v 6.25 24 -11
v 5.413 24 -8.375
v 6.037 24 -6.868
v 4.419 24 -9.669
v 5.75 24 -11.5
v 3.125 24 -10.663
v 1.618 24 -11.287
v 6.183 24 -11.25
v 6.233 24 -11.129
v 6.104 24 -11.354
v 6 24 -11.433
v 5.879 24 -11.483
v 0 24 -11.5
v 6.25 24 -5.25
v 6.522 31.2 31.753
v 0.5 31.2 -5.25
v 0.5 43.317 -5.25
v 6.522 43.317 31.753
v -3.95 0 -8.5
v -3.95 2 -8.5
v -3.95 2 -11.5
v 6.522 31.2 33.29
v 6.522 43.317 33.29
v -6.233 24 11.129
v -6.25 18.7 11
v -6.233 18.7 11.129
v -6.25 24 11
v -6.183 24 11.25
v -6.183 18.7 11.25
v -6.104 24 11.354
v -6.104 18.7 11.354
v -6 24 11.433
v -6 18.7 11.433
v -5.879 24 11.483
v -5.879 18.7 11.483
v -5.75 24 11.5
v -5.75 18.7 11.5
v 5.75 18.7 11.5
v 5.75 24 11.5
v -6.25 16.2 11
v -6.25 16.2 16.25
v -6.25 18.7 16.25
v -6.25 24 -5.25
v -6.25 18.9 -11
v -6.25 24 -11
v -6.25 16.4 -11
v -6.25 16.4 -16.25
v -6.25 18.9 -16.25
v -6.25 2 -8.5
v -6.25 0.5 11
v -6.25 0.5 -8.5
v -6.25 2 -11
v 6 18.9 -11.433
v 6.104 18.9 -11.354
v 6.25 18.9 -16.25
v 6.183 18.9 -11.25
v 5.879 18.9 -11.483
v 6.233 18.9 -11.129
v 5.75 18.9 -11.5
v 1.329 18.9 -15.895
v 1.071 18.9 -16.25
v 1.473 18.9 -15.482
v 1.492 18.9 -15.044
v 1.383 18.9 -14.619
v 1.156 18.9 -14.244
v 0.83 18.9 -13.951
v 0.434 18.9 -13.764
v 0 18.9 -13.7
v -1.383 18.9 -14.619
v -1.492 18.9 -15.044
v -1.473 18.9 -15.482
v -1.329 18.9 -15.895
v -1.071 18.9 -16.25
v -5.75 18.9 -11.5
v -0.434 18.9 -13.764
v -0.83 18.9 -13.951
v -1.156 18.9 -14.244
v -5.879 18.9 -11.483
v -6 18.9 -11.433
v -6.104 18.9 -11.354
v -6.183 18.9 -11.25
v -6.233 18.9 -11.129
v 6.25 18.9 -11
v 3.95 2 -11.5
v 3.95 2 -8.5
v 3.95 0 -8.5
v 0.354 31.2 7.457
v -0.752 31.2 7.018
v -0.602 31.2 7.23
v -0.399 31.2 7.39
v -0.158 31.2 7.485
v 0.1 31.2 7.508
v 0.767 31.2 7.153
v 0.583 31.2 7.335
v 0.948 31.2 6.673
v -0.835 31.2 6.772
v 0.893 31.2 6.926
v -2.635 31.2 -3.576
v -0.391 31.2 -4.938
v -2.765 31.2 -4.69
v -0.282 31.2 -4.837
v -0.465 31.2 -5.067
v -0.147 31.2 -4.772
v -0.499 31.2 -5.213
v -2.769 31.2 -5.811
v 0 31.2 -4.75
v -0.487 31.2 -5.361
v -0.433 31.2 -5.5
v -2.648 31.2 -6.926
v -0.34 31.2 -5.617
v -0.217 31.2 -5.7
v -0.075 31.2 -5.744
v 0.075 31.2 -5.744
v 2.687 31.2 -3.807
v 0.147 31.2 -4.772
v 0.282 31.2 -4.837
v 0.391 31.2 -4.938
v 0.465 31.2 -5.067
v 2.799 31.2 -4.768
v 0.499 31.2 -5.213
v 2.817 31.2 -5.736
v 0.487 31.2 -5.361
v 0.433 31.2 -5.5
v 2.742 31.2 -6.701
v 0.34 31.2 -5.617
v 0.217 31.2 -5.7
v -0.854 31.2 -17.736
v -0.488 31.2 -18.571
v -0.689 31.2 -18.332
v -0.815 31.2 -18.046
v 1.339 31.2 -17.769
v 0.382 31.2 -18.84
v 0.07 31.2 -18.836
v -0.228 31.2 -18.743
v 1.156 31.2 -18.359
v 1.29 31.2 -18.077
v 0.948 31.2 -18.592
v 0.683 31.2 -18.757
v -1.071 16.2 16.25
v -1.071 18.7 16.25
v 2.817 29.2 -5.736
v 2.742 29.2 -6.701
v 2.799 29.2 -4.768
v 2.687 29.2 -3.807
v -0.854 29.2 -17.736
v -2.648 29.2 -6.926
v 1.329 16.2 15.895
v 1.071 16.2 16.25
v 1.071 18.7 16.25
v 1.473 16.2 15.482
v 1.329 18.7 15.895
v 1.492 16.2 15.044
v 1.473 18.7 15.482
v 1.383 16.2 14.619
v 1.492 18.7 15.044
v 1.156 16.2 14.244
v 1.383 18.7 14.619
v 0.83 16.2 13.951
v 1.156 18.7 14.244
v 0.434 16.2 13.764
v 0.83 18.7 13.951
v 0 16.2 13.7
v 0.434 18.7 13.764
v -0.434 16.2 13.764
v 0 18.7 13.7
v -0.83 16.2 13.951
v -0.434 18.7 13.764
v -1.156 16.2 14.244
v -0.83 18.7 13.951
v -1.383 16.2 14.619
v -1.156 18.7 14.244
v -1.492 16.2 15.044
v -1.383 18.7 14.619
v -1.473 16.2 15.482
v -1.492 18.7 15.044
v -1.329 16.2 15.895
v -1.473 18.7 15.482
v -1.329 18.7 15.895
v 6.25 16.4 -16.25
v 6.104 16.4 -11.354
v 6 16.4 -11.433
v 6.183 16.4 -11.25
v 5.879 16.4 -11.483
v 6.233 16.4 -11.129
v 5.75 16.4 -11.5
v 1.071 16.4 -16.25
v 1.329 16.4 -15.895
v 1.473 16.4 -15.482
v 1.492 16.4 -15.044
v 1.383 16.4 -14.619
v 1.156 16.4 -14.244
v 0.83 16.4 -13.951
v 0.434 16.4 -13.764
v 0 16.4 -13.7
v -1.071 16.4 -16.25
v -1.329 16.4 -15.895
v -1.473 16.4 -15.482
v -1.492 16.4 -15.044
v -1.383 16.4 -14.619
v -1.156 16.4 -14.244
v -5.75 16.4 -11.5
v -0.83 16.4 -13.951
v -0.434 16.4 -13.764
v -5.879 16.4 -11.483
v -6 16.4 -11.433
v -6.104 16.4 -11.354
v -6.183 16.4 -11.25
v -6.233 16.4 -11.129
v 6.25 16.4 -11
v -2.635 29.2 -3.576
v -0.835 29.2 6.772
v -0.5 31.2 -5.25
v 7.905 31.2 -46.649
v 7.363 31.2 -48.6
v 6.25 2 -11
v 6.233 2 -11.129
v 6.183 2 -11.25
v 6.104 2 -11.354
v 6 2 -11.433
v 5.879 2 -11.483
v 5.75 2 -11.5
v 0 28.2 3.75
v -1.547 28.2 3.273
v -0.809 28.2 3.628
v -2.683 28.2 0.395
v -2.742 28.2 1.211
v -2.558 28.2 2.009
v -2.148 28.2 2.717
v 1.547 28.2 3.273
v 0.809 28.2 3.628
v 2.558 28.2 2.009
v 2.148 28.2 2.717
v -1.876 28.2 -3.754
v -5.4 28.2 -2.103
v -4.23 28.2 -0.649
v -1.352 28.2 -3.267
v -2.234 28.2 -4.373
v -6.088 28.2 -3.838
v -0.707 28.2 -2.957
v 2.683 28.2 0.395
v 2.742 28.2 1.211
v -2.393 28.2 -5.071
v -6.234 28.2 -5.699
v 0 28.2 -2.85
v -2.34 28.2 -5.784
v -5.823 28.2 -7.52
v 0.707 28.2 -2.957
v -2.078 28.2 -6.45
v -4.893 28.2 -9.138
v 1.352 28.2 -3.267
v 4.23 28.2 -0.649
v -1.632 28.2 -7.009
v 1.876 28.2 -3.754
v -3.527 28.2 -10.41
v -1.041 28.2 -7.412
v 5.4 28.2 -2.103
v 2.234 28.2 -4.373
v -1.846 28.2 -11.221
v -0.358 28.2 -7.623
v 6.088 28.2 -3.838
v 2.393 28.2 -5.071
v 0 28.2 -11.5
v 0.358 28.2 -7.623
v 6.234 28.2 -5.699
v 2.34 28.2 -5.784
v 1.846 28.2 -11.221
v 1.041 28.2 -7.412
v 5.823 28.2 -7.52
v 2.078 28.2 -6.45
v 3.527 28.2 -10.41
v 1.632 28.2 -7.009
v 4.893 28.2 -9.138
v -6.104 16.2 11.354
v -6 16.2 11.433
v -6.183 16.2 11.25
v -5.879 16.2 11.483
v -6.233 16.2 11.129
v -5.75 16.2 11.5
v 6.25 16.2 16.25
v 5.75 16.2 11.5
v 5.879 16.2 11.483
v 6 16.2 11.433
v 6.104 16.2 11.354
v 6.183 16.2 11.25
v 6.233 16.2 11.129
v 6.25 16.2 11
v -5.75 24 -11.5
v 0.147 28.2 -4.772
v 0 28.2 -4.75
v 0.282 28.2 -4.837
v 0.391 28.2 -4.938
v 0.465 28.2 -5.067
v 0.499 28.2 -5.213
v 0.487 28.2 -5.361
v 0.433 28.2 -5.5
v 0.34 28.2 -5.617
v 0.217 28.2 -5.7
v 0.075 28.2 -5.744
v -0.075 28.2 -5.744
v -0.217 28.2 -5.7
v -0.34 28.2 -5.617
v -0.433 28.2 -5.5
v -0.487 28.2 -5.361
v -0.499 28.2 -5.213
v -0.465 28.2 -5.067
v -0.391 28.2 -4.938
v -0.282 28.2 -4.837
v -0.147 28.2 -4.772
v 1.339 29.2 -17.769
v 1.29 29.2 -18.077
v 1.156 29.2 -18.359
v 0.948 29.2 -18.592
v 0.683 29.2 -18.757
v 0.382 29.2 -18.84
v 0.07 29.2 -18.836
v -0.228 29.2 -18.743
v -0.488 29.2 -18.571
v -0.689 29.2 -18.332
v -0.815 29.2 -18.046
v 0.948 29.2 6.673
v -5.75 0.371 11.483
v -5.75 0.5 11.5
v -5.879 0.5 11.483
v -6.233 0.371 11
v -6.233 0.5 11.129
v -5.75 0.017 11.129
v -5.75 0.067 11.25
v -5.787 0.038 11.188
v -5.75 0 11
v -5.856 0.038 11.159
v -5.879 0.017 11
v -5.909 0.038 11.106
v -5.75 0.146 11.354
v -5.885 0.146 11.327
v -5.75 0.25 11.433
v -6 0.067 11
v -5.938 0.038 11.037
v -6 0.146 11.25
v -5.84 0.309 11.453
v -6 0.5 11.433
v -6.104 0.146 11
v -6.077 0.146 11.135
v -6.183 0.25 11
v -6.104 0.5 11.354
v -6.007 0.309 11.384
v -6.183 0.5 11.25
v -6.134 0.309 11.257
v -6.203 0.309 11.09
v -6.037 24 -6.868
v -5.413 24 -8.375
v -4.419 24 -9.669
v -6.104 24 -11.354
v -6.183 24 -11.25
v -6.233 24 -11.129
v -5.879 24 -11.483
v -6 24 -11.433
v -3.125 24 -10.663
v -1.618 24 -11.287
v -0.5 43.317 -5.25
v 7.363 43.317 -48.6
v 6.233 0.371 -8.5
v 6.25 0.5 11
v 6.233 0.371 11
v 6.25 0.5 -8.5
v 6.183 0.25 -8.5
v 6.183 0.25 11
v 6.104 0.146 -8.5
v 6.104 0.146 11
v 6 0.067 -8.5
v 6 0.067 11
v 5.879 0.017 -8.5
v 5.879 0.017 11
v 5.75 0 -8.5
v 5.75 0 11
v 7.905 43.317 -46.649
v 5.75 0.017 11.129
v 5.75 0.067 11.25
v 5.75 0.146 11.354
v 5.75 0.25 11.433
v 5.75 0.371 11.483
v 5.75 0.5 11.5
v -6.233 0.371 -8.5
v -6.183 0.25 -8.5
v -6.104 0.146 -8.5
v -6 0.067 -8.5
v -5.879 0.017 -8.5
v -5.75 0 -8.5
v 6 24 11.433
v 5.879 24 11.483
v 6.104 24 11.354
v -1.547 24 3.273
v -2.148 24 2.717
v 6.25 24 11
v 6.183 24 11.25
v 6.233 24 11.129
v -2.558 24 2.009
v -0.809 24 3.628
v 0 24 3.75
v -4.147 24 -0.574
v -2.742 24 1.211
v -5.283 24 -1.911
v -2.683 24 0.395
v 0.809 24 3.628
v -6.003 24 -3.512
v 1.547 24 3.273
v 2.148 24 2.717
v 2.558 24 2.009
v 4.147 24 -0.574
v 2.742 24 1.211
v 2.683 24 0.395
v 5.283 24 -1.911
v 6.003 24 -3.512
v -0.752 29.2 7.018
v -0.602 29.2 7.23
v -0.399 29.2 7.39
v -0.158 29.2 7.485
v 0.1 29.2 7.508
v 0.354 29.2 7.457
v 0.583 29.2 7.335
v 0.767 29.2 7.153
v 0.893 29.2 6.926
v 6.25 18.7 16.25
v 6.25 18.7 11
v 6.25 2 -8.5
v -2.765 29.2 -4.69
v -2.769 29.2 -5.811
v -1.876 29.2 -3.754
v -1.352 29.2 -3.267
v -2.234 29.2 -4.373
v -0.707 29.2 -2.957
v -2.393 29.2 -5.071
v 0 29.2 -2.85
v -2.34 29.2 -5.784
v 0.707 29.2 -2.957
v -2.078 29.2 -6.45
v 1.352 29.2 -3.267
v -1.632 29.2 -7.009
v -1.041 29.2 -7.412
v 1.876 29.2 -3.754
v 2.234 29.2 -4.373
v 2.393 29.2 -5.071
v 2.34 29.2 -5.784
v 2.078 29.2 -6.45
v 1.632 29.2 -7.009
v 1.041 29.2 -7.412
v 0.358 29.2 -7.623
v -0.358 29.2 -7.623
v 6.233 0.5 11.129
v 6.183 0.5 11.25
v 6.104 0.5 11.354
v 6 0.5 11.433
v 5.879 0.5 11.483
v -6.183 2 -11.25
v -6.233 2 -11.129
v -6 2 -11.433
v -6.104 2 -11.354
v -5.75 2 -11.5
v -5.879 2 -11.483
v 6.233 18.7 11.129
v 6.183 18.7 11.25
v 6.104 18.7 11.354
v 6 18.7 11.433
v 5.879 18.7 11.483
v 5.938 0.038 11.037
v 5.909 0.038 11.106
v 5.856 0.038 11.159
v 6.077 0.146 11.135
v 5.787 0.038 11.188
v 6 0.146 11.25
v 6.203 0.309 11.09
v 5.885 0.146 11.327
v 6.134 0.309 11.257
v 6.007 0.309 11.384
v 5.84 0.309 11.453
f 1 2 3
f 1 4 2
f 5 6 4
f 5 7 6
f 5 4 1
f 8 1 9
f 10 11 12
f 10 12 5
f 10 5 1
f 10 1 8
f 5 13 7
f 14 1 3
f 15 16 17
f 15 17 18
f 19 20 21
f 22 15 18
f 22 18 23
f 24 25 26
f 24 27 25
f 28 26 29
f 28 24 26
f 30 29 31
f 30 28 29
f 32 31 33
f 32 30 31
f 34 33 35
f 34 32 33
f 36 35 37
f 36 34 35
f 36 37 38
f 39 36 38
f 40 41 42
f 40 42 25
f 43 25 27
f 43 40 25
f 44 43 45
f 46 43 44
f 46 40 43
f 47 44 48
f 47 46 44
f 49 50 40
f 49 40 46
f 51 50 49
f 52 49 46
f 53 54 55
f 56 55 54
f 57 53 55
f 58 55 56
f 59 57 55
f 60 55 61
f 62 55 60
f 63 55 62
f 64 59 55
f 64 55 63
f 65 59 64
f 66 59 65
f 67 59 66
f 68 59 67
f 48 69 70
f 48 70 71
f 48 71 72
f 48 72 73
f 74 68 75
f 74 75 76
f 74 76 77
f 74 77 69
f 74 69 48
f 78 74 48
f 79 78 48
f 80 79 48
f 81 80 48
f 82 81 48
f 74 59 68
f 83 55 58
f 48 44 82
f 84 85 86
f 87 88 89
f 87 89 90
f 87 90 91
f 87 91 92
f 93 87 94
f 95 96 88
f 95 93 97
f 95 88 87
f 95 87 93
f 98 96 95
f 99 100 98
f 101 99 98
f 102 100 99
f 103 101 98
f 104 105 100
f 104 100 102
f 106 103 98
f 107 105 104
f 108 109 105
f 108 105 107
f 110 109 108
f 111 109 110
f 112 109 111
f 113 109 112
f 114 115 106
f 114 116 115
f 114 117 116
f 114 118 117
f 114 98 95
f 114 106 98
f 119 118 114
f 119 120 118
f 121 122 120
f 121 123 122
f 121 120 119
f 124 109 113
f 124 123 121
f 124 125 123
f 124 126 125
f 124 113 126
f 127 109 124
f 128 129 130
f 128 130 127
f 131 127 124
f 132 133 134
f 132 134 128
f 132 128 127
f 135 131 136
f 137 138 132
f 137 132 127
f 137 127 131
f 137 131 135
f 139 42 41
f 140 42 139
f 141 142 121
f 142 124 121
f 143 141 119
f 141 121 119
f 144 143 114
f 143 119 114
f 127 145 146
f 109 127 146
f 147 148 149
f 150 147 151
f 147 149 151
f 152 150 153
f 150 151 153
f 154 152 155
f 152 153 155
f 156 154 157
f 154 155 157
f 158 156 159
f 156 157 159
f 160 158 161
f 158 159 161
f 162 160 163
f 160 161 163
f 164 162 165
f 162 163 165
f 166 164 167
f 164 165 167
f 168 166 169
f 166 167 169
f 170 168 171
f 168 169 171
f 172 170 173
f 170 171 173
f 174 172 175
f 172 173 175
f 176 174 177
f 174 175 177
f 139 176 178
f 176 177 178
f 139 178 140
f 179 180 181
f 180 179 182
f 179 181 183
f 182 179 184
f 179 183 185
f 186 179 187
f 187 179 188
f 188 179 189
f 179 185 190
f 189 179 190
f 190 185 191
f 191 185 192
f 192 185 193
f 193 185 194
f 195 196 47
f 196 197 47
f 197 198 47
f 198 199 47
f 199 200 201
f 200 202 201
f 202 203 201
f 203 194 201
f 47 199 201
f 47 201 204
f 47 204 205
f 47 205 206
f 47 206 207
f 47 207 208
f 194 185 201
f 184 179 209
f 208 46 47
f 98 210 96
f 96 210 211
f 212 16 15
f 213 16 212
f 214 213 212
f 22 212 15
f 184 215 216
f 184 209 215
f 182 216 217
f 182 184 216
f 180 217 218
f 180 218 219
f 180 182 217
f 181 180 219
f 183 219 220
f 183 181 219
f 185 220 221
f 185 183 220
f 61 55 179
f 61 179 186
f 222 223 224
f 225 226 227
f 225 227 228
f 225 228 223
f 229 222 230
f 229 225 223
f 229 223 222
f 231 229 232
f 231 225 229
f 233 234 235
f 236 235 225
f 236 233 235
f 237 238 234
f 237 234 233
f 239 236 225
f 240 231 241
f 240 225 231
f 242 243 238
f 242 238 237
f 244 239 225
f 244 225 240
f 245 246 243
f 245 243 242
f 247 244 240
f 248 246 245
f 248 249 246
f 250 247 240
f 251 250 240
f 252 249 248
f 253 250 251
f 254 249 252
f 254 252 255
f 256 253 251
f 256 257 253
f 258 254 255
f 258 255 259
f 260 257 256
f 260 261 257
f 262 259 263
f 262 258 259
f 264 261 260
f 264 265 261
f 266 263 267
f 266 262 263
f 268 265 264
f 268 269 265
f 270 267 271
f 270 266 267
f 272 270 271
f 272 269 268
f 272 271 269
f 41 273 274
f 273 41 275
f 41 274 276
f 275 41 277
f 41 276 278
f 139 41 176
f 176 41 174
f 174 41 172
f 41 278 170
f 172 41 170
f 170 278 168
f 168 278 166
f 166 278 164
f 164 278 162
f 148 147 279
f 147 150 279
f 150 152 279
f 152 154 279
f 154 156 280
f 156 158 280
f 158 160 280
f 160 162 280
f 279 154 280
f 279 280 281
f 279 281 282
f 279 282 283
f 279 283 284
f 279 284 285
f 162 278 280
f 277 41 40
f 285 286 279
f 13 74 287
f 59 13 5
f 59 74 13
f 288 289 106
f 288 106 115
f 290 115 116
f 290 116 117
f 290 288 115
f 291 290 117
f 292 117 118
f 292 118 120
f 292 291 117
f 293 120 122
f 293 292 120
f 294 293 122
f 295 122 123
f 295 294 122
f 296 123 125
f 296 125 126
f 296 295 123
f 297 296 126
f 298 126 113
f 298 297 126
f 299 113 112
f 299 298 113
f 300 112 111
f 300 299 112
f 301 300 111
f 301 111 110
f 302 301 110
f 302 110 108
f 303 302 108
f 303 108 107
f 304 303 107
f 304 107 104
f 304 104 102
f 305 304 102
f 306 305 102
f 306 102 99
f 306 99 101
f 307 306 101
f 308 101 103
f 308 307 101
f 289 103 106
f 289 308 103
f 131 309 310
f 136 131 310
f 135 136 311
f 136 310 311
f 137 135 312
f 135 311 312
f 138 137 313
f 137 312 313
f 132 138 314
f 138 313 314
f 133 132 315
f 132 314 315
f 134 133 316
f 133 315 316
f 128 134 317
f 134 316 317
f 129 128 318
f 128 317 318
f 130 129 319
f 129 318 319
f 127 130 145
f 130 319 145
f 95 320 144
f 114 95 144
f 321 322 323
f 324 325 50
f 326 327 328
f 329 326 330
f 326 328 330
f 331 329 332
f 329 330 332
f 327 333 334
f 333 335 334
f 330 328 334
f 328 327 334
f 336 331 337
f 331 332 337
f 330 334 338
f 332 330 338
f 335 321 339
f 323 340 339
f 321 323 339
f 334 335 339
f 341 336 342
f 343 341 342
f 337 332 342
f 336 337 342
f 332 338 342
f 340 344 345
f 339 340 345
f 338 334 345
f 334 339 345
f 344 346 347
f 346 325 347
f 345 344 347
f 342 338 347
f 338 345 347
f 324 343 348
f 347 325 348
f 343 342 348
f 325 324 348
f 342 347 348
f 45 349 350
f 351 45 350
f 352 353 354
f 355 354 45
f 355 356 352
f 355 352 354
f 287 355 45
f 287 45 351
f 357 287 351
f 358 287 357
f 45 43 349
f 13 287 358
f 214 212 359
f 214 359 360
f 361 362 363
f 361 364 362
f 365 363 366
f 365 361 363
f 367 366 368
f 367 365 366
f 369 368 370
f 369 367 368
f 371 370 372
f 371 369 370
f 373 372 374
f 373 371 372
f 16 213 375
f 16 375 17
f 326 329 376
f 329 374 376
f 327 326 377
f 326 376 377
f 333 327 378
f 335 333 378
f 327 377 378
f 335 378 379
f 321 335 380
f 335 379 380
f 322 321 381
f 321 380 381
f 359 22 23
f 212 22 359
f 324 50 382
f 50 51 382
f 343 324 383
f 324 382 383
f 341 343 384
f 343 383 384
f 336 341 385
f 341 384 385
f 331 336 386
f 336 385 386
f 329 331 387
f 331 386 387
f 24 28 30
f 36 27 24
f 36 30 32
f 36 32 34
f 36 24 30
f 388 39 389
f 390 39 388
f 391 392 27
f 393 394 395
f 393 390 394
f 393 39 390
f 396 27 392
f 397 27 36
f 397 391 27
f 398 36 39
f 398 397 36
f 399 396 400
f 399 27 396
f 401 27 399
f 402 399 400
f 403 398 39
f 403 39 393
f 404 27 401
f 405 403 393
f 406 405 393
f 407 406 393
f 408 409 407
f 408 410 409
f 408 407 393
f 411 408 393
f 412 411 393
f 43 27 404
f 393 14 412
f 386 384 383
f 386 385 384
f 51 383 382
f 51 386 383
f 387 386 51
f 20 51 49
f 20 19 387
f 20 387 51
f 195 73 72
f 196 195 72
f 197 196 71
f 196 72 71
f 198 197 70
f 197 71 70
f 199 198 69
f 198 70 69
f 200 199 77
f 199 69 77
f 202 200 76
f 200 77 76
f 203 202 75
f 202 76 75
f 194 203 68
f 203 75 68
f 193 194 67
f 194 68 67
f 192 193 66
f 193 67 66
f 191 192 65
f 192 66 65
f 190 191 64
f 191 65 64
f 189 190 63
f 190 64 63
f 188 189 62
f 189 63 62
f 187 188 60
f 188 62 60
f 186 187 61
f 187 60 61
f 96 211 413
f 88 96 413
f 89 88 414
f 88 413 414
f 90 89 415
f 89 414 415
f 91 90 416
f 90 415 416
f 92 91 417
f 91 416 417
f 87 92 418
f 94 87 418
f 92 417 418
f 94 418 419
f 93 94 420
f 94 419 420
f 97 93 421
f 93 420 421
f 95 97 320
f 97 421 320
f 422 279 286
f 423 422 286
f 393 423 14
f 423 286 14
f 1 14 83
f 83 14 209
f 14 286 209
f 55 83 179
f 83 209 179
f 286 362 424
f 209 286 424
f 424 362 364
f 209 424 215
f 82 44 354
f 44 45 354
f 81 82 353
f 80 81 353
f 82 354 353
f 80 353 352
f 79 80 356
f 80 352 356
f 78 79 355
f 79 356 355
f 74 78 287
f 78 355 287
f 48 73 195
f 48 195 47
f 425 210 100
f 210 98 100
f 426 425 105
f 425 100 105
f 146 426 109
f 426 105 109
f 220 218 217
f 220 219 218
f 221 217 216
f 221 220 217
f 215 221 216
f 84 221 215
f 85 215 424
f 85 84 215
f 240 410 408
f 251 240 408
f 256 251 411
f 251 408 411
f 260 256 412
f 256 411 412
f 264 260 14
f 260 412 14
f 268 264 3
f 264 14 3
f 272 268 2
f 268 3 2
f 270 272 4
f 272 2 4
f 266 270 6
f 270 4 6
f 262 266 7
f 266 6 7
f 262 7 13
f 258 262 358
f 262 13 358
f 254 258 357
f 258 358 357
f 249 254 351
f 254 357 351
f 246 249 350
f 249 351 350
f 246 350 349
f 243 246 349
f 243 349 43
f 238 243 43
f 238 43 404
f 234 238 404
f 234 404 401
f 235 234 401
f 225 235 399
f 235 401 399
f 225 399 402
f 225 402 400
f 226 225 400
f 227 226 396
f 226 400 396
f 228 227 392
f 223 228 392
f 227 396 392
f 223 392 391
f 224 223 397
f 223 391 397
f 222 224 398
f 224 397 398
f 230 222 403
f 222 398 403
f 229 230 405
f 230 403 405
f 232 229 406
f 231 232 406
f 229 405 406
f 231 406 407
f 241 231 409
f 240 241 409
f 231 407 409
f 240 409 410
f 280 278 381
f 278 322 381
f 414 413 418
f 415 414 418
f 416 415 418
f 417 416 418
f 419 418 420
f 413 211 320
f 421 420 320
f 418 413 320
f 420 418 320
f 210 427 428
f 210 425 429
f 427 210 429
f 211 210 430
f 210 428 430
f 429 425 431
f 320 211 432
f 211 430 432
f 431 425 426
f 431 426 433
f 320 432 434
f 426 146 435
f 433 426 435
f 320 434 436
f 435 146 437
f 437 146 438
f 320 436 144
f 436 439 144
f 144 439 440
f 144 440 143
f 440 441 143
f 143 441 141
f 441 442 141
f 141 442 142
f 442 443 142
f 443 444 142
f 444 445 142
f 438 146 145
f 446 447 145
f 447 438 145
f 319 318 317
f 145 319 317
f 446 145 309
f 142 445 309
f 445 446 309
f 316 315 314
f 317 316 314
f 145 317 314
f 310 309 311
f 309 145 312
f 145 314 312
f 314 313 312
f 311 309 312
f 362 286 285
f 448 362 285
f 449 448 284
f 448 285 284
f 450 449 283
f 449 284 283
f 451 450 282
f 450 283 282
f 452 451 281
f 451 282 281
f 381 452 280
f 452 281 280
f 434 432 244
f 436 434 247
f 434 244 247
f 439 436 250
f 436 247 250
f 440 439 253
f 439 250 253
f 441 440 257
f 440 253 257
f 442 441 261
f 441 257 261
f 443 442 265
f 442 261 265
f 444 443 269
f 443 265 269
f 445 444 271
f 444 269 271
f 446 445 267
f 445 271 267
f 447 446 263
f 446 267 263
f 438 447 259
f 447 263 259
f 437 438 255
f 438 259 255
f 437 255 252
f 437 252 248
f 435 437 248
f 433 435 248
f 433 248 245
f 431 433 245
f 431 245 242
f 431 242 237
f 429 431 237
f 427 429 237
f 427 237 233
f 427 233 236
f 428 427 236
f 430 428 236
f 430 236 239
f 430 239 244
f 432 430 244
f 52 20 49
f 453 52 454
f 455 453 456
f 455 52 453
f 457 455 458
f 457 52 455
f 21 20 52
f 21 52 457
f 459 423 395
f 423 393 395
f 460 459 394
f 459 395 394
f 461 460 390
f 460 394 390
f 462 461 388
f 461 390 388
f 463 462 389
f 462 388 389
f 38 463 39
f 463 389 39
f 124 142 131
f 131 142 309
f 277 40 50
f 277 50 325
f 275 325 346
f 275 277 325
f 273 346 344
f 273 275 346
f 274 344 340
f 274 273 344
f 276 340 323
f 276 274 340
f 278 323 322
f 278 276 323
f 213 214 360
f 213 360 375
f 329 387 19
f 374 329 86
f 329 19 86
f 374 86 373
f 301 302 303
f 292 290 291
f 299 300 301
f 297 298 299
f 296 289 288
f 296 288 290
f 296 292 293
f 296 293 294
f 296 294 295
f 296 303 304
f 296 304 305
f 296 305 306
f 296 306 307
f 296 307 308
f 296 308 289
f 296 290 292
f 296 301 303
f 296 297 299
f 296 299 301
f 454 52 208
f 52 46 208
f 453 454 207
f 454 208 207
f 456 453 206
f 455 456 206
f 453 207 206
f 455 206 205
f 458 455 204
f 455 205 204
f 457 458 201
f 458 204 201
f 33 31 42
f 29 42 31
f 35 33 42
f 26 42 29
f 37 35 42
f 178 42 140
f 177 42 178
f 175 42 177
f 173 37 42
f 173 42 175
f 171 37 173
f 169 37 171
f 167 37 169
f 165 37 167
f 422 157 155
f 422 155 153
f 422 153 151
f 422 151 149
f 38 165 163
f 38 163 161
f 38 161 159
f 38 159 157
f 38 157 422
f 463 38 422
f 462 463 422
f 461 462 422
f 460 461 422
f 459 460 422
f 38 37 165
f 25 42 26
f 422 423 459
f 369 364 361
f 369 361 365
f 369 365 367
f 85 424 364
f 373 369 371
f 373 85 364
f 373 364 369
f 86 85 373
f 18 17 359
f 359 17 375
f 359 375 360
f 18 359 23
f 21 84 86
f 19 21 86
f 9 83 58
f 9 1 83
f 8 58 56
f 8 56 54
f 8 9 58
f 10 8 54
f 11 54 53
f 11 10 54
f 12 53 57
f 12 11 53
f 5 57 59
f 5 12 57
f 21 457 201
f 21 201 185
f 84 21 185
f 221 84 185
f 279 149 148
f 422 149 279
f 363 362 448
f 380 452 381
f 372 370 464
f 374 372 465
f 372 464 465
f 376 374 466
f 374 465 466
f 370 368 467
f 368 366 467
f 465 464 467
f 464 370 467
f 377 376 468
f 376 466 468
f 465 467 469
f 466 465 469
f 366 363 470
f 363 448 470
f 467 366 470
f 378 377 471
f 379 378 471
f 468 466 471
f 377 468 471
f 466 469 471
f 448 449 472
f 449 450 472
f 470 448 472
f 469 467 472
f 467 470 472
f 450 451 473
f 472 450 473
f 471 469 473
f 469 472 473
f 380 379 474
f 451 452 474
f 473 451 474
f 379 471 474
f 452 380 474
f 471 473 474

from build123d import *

# Parameters (mm, degrees)
SKETCH1_W               = 12.5
SKETCH1_H               = 23
BOSS_EXTRUDE1_DEPTH     = 24
BOSS_EXTRUDE2_DEPTH     = 4.2
SKETCH3_R               = 2.4
SKETCH3_R_2             = 0.5
BOSS_EXTRUDE3_DEPTH     = 3
SKETCH4_W               = 12.5
SKETCH4_H               = 2.5
BOSS_EXTRUDE4_DEPTH     = 4.75
SKETCH5_W               = 12.5
SKETCH5_H               = 2.5
BOSS_EXTRUDE5_DEPTH     = 4.75
CUT_EXTRUDE1_REACH      = 27.55
SKETCH6_R               = 1.5
CUT_EXTRUDE2_REACH      = 27.697
SKETCH8_R               = 1.5
CUT_EXTRUDE4_DEPTH      = 38.33299479
CUT_EXTRUDE6_DEPTH      = 38.33299479
CUT_EXTRUDE6_DEPTH_BACK = 2.3
CUT_EXTRUDE7_DEPTH      = 38.33299479
CUT_EXTRUDE7_DEPTH_BACK = 2.3
FILLET1_R               = 0.5
SALIENTE_EXTRUIR2_START = -2
CROQUIS2_R              = 2.4
SALIENTE_EXTRUIR2_DEPTH = 2
REDONDEO1_R             = 10
SALIENTE_EXTRUIR5_DEPTH = 12.116642018


with BuildPart() as part:
    # Sketch1 → Boss-Extrude1 (new body)
    with BuildSketch(Plane(origin=(0, 0, 0), x_dir=(1, 0, 0), z_dir=(0, 1, 0))):
        Rectangle(SKETCH1_W, SKETCH1_H)
    extrude(amount=BOSS_EXTRUDE1_DEPTH)

    # Sketch2 → Boss-Extrude2 (add)
    with BuildSketch(Plane(origin=(0, 24, 0), x_dir=(1, 0, 0), z_dir=(0, 1, 0))):
        with BuildLine():
            ThreePointArc((2.682624648, -0.395), (0, 11.5), (-2.682624648, -0.395))
            ThreePointArc((-2.682624648, -0.395), (0, -3.75), (2.682624648, -0.395))
        make_face()
    extrude(amount=BOSS_EXTRUDE2_DEPTH)

    # Sketch3 → Boss-Extrude3 (add)
    with BuildSketch(Plane(origin=(0, 28.2, 0), x_dir=(1, 0, 0), z_dir=(0, 1, 0))):
        with Locations(Location((0, 5.25, 0), (0, 0, 270))):
            Circle(SKETCH3_R)
        with Locations(Location((0, 5.25, 0), (0, 0, 270))):
            Circle(SKETCH3_R_2, mode=Mode.SUBTRACT)
    extrude(amount=BOSS_EXTRUDE3_DEPTH)

    # Sketch4 → Boss-Extrude4 (add)
    with BuildSketch(Plane(origin=(0, 0, -11.5), x_dir=(-1, 0, 0), z_dir=(0, 0, -1))):
        with Locations((0, 17.65)):
            Rectangle(SKETCH4_W, SKETCH4_H)
    extrude(amount=BOSS_EXTRUDE4_DEPTH)

    # Sketch5 → Boss-Extrude5 (add)
    with BuildSketch(Plane.XY.offset(11.5)):
        with Locations((0, 17.45)):
            Rectangle(SKETCH5_W, SKETCH5_H)
    extrude(amount=BOSS_EXTRUDE5_DEPTH)

    # Sketch6 → Cut-Extrude1 (cut, up to next)
    with BuildSketch(Plane(origin=(0, 18.7, 0), x_dir=(1, 0, 0), z_dir=(0, 1, 0)), mode=Mode.PRIVATE) as cut_extrude1_sk1:
        with Locations((0, -15.2)):
            Circle(SKETCH6_R)
    cut_extrude1_tool1 = extrude(cut_extrude1_sk1.sketch, amount=-CUT_EXTRUDE1_REACH, mode=Mode.PRIVATE) & part.part
    add(cut_extrude1_tool1.solids().sort_by_distance((0, 18.7, 15.2))[0], mode=Mode.SUBTRACT)

    # Sketch8 → Cut-Extrude2 (cut, up to next)
    with BuildSketch(Plane(origin=(0, 18.9, 0), x_dir=(1, 0, 0), z_dir=(0, 1, 0)), mode=Mode.PRIVATE) as cut_extrude2_sk1:
        with Locations((0, 15.2)):
            Circle(SKETCH8_R)
    cut_extrude2_tool1 = extrude(cut_extrude2_sk1.sketch, amount=-CUT_EXTRUDE2_REACH, mode=Mode.PRIVATE) & part.part
    add(cut_extrude2_tool1.solids().sort_by_distance((0, 18.9, -15.2))[0], mode=Mode.SUBTRACT)

    # Sketch9 → Cut-Extrude4 (cut, through all)
    with BuildSketch(Plane(origin=(6.25, 0, 0), x_dir=(0, 0, -1), z_dir=(1, 0, 0))):
        Polygon((11.5, 2), (8.5, 0), (11.5, 0), align=None)
    extrude(amount=-CUT_EXTRUDE4_DEPTH, mode=Mode.SUBTRACT)

    # Sketch10 → Cut-Extrude6 (cut, two sides: drawn at the far end of the back side and taken through both)
    with BuildSketch(Plane(origin=(6.25, 0, 0), x_dir=(0, 0, -1), z_dir=(1, 0, 0)).offset(-CUT_EXTRUDE6_DEPTH_BACK)):
        Polygon((102.065563363, 2), (11.5, 2), (8.5, 2), (8.5, 0), (8.5, -90.565563363), (135.889097577, -219.33086493), (229.45466094, -126.765301567), align=None)
    extrude(amount=CUT_EXTRUDE6_DEPTH + CUT_EXTRUDE6_DEPTH_BACK, mode=Mode.SUBTRACT)

    # Sketch11 → Cut-Extrude7 (cut, two sides: drawn at the far end of the back side and taken through both)
    with BuildSketch(Plane.ZY.offset(6.25).offset(-CUT_EXTRUDE7_DEPTH_BACK)):
        Polygon((-102.065563363, 2), (-11.5, 2), (-8.5, 2), (-8.5, 0), (-8.5, -90.565563363), (-135.889097577, -219.33086493), (-229.45466094, -126.765301567), align=None)
    extrude(amount=CUT_EXTRUDE7_DEPTH + CUT_EXTRUDE7_DEPTH_BACK, mode=Mode.SUBTRACT)

    # Fillet1
    fillet1_edges = [part.edges().sort_by_distance(p)[0] for p in [
        (-6.25, 9.2, -11.5),
        (6.25, 9.2, -11.5),
        (6.25, 8.1, 11.5),
        (-6.25, 8.1, 11.5),
        (6.25, 0, 1.5),
        (0, 0, 11.5),
        (-6.25, 21.45, -11.5),
        (6.25, 21.45, -11.5),
        (6.25, 21.35, 11.5),
        (-6.25, 0, 1.5),
        (-6.25, 21.35, 11.5),
    ]]
    fillet(fillet1_edges, radius=FILLET1_R)

    # Croquis2 → Saliente-Extruir2 (add)
    with BuildSketch(Plane(origin=(0, 31.2, 0), x_dir=(1, 0, 0), z_dir=(0, 1, 0)).offset(SALIENTE_EXTRUIR2_START)):
        with BuildLine():
            Line((-2.926200175, 5.25), (-0.834835747, -6.772385738))
            ThreePointArc((-0.834835747, -6.772385738), (0.100143784, -7.508414302), (0.947766476, -6.673273269))
            Line((0.947766476, -6.673273269), (2.926200175, 5.25))
            Line((2.926200175, 5.25), (1.339323404, 17.768743365))
            ThreePointArc((1.339323404, 17.768743365), (0.226116887, 18.849246596), (-0.854386344, 17.736040078))
            Line((-0.854386344, 17.736040078), (-2.926200175, 5.25))
        make_face()
        with Locations((0, 5.25)):
            Circle(CROQUIS2_R, mode=Mode.SUBTRACT)
    extrude(amount=SALIENTE_EXTRUIR2_DEPTH)

    # Redondeo1
    redondeo1_edges = [part.edges().sort_by_distance(p)[0] for p in [
        (-2.926200175, 30.2, -5.25),
        (2.926200175, 30.2, -5.25),
    ]]
    fillet(redondeo1_edges, radius=REDONDEO1_R)


with BuildPart() as body_2:
    # Croquis3 → Saliente-Extruir5 (new body)
    with BuildSketch(Plane(origin=(0, 31.2, 0), x_dir=(1, 0, 0), z_dir=(0, 1, 0))):
        Polygon((-0.5, 5.25), (7.362800966, 48.599539288), (7.90454263, 46.649269295), (0.5, 5.25), (6.521630696, -31.753310854), (6.521630696, -33.289699738), align=None)
    extrude(amount=SALIENTE_EXTRUIR5_DEPTH)


solid = Compound([part.part, body_2.part])
